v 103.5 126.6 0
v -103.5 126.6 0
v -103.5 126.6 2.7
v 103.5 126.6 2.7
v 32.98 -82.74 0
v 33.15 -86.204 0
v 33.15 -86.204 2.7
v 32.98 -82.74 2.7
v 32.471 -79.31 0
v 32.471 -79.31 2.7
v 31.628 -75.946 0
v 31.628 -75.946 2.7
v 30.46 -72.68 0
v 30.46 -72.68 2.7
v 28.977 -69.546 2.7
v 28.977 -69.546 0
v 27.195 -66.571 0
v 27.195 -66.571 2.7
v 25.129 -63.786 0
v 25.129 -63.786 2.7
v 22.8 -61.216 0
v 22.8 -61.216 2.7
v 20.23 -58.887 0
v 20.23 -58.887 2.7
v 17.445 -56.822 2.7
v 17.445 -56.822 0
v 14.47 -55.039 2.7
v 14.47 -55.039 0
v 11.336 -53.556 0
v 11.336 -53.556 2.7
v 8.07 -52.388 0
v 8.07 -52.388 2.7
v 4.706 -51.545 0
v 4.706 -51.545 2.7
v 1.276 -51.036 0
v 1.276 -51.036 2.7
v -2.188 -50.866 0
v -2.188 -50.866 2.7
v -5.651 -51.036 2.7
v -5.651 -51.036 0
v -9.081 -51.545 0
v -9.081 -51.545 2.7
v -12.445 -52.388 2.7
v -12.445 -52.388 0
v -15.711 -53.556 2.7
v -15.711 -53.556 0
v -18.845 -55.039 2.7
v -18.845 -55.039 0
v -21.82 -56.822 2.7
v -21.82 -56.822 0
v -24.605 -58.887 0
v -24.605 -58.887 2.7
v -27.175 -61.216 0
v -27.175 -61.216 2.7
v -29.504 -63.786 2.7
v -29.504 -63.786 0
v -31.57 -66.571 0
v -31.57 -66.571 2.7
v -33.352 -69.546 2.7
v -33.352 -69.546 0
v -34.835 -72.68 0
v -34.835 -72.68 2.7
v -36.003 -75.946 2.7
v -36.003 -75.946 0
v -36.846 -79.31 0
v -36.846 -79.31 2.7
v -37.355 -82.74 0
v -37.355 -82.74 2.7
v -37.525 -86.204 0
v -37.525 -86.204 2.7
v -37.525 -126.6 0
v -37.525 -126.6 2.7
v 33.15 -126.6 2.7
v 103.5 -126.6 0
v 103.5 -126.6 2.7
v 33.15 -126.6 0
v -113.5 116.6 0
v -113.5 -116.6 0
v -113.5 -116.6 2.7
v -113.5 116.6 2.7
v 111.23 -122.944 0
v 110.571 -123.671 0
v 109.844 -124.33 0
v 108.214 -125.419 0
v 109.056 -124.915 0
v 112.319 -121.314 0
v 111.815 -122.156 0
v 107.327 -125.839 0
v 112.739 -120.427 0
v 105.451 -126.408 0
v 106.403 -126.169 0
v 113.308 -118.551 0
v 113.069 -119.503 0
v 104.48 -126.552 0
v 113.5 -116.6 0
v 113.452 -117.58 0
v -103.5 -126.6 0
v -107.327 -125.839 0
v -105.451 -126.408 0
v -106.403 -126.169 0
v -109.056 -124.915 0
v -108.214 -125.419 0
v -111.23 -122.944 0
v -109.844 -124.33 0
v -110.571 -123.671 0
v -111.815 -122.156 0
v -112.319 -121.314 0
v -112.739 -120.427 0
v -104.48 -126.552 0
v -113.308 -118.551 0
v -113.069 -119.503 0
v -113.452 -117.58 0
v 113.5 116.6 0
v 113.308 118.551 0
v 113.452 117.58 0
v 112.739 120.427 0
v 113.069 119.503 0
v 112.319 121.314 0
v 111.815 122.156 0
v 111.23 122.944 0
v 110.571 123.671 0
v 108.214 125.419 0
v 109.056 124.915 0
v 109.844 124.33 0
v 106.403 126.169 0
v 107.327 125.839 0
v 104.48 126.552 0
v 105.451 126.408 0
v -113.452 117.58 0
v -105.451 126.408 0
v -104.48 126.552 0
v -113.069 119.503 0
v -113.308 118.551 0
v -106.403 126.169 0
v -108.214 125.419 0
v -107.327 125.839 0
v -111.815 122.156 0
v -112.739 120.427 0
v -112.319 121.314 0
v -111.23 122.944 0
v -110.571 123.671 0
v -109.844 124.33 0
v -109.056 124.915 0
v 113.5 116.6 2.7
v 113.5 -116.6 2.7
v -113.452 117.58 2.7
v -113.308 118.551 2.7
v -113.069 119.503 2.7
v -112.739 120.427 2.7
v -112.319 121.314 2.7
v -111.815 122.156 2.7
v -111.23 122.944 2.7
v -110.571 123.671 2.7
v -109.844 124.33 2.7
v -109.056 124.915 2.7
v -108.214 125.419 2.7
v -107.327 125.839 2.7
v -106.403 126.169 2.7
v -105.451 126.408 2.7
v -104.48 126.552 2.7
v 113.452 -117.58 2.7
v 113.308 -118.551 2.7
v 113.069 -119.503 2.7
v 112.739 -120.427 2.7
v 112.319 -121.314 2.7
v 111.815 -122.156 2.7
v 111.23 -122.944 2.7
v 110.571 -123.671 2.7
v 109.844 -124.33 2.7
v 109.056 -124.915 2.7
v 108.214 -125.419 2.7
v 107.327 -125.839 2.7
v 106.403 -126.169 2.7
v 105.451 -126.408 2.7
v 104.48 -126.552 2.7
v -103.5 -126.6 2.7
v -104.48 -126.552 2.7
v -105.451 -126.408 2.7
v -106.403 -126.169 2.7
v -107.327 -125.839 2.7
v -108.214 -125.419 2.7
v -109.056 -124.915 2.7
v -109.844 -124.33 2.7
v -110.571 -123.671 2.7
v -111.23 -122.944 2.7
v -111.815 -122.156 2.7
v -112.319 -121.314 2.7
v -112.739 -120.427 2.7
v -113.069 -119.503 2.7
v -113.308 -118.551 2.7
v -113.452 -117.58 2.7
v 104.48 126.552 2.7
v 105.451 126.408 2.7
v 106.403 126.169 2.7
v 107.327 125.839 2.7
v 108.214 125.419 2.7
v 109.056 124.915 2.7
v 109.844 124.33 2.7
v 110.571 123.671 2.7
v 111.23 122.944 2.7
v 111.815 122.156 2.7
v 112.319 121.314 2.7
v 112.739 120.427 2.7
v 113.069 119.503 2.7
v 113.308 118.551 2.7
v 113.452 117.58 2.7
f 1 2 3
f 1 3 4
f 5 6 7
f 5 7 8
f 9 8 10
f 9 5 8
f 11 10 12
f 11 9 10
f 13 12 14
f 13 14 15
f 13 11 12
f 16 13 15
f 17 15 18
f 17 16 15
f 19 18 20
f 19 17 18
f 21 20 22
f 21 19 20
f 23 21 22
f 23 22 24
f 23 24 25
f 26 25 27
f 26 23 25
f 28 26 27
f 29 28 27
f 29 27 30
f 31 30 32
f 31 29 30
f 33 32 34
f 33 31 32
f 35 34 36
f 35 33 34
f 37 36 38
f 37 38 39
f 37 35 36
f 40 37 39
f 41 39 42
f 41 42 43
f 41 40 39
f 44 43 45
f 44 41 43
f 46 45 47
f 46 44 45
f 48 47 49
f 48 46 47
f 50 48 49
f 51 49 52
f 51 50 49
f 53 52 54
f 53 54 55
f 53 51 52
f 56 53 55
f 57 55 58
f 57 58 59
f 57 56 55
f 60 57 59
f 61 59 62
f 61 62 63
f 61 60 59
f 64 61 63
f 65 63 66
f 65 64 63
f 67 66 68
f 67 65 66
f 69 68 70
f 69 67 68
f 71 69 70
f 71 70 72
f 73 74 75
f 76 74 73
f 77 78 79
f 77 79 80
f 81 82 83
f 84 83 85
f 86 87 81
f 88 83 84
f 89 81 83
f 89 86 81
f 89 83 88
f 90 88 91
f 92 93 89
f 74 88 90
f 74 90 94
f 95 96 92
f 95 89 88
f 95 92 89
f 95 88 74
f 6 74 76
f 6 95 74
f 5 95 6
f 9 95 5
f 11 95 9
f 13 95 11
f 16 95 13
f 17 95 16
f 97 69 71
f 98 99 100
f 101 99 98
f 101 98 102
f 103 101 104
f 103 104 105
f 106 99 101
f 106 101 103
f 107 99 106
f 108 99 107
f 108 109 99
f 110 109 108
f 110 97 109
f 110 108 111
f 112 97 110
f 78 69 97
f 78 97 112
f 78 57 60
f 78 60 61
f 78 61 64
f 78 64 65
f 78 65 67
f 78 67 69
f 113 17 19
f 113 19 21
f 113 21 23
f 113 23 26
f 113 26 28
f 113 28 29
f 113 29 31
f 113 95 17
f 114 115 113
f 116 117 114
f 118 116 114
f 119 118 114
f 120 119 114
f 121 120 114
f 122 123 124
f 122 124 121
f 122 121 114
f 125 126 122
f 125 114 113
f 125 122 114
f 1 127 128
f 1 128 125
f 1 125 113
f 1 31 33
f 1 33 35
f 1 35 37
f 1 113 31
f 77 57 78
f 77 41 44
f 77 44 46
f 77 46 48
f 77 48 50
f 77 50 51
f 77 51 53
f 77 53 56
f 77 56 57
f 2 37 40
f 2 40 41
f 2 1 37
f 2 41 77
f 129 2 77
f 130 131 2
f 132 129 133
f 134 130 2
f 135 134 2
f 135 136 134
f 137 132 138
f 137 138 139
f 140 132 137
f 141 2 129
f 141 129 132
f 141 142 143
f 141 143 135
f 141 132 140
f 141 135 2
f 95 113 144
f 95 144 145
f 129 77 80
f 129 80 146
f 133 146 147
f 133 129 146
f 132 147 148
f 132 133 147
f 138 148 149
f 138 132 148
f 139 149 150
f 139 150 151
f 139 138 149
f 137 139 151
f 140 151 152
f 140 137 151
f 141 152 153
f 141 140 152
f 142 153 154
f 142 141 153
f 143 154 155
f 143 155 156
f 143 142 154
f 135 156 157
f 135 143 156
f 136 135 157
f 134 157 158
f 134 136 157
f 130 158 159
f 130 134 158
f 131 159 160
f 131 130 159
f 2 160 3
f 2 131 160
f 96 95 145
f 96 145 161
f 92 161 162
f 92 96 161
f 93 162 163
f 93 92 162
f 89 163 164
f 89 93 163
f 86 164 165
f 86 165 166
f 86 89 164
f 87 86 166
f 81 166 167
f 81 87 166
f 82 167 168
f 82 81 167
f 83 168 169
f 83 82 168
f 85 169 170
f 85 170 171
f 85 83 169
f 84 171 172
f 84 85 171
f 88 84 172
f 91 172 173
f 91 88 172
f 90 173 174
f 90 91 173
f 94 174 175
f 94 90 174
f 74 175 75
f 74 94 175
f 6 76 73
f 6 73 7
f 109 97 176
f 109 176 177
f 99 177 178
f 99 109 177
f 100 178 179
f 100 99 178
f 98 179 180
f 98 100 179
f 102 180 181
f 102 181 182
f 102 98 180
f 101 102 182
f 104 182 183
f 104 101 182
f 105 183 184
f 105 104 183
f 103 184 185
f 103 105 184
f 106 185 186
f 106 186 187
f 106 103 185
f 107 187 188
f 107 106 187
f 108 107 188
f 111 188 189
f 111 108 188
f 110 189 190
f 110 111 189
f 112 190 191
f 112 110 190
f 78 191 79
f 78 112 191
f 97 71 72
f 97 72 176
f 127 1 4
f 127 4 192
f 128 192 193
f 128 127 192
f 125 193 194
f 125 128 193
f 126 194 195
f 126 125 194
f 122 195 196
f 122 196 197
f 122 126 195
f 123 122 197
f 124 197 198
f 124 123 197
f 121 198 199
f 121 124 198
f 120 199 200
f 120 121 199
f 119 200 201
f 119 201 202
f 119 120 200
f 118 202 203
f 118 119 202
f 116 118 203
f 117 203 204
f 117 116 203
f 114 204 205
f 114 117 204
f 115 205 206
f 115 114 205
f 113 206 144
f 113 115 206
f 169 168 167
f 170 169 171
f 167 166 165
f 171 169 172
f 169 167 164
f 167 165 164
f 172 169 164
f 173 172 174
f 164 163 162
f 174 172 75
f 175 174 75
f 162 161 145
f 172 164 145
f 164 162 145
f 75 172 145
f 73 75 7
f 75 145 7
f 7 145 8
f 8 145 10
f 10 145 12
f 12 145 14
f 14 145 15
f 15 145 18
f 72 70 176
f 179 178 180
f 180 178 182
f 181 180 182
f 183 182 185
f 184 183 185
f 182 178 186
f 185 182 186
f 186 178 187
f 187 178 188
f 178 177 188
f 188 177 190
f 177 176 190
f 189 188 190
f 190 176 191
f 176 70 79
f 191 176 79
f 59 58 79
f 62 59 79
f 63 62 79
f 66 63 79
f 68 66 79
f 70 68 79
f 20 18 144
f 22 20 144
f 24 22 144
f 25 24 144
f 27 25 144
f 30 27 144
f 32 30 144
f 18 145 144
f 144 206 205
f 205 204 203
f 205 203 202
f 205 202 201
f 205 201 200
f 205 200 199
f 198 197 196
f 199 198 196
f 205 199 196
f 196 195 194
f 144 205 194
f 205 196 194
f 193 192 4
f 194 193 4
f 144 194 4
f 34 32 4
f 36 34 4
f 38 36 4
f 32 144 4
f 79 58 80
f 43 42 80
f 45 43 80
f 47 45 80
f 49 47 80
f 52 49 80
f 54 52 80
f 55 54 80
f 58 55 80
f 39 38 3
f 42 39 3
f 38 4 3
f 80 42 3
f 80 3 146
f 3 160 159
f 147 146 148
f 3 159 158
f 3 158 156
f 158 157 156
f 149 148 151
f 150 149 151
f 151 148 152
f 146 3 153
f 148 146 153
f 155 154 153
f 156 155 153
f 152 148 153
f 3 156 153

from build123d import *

# Parameters (mm, degrees)
BOSS_EXTRUDE1_DEPTH = 2.7


with BuildPart() as part:
    # Sketch1 → Boss-Extrude1 (new body)
    with BuildSketch(Plane.XY):
        with BuildLine():
            Line((-103.5, 126.6), (103.5, 126.6))
            ThreePointArc((103.5, 126.6), (110.571067812, 123.671067812), (113.5, 116.6))
            Line((113.5, 116.6), (113.5, -116.6))
            ThreePointArc((113.5, -116.6), (110.571067812, -123.671067812), (103.5, -126.6))
            Line((103.5, -126.6), (33.149945785, -126.6))
            Line((33.149945785, -126.6), (33.149945785, -86.203548192))
            ThreePointArc((33.149945785, -86.203548192), (-2.1875, -50.866102407), (-37.524945785, -86.203548192))
            Line((-37.524945785, -86.203548192), (-37.524945785, -126.6))
            Line((-37.524945785, -126.6), (-103.5, -126.6))
            ThreePointArc((-103.5, -126.6), (-110.571067812, -123.671067812), (-113.5, -116.6))
            Line((-113.5, -116.6), (-113.5, 116.6))
            ThreePointArc((-113.5, 116.6), (-110.571067812, 123.671067812), (-103.5, 126.6))
        make_face()
    extrude(amount=BOSS_EXTRUDE1_DEPTH)


solid = part.part
